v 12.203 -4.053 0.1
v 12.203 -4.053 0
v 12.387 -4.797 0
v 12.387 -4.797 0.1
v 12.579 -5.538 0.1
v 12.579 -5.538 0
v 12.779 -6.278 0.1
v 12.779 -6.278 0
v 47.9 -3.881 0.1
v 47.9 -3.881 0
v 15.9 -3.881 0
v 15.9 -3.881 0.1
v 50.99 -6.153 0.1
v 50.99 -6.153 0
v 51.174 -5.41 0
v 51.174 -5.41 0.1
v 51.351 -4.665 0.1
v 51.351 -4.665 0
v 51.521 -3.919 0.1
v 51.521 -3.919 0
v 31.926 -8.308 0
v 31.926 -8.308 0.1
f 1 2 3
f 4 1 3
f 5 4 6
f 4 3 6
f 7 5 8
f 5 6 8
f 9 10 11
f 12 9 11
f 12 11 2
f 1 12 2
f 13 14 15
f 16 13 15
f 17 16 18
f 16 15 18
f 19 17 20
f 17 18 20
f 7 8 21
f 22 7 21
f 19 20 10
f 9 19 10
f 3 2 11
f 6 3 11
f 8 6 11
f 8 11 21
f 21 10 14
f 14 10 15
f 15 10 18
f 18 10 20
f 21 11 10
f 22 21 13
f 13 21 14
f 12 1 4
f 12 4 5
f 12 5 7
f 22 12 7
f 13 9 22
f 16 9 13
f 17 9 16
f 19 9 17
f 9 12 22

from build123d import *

# Parameters (mm, degrees)
SALIENTE_EXTRUIR1_DEPTH = 0.1


with BuildPart() as part:
    # Model → Saliente-Extruir1 (new body)
    with BuildSketch(Plane.XY):
        with BuildLine():
            Line((47.900286295, -3.880714535), (15.900286295, -3.880714535))
            Line((15.900286295, -3.880714535), (12.202555869, -4.052676889))
            ThreePointArc((12.202555869, -4.052676889), (12.48180991, -5.167779291), (12.778578315, -6.278348831))
            Line((12.778578315, -6.278348831), (31.925658705, -8.308398583))
            Line((31.925658705, -8.308398583), (50.990379009, -6.152892242))
            ThreePointArc((50.990379009, -6.152892242), (51.263698747, -5.03797547), (51.52136497, -3.919337367))
            Line((51.52136497, -3.919337367), (47.900286295, -3.880714535))
        make_face()
    extrude(amount=SALIENTE_EXTRUIR1_DEPTH)


solid = part.part
